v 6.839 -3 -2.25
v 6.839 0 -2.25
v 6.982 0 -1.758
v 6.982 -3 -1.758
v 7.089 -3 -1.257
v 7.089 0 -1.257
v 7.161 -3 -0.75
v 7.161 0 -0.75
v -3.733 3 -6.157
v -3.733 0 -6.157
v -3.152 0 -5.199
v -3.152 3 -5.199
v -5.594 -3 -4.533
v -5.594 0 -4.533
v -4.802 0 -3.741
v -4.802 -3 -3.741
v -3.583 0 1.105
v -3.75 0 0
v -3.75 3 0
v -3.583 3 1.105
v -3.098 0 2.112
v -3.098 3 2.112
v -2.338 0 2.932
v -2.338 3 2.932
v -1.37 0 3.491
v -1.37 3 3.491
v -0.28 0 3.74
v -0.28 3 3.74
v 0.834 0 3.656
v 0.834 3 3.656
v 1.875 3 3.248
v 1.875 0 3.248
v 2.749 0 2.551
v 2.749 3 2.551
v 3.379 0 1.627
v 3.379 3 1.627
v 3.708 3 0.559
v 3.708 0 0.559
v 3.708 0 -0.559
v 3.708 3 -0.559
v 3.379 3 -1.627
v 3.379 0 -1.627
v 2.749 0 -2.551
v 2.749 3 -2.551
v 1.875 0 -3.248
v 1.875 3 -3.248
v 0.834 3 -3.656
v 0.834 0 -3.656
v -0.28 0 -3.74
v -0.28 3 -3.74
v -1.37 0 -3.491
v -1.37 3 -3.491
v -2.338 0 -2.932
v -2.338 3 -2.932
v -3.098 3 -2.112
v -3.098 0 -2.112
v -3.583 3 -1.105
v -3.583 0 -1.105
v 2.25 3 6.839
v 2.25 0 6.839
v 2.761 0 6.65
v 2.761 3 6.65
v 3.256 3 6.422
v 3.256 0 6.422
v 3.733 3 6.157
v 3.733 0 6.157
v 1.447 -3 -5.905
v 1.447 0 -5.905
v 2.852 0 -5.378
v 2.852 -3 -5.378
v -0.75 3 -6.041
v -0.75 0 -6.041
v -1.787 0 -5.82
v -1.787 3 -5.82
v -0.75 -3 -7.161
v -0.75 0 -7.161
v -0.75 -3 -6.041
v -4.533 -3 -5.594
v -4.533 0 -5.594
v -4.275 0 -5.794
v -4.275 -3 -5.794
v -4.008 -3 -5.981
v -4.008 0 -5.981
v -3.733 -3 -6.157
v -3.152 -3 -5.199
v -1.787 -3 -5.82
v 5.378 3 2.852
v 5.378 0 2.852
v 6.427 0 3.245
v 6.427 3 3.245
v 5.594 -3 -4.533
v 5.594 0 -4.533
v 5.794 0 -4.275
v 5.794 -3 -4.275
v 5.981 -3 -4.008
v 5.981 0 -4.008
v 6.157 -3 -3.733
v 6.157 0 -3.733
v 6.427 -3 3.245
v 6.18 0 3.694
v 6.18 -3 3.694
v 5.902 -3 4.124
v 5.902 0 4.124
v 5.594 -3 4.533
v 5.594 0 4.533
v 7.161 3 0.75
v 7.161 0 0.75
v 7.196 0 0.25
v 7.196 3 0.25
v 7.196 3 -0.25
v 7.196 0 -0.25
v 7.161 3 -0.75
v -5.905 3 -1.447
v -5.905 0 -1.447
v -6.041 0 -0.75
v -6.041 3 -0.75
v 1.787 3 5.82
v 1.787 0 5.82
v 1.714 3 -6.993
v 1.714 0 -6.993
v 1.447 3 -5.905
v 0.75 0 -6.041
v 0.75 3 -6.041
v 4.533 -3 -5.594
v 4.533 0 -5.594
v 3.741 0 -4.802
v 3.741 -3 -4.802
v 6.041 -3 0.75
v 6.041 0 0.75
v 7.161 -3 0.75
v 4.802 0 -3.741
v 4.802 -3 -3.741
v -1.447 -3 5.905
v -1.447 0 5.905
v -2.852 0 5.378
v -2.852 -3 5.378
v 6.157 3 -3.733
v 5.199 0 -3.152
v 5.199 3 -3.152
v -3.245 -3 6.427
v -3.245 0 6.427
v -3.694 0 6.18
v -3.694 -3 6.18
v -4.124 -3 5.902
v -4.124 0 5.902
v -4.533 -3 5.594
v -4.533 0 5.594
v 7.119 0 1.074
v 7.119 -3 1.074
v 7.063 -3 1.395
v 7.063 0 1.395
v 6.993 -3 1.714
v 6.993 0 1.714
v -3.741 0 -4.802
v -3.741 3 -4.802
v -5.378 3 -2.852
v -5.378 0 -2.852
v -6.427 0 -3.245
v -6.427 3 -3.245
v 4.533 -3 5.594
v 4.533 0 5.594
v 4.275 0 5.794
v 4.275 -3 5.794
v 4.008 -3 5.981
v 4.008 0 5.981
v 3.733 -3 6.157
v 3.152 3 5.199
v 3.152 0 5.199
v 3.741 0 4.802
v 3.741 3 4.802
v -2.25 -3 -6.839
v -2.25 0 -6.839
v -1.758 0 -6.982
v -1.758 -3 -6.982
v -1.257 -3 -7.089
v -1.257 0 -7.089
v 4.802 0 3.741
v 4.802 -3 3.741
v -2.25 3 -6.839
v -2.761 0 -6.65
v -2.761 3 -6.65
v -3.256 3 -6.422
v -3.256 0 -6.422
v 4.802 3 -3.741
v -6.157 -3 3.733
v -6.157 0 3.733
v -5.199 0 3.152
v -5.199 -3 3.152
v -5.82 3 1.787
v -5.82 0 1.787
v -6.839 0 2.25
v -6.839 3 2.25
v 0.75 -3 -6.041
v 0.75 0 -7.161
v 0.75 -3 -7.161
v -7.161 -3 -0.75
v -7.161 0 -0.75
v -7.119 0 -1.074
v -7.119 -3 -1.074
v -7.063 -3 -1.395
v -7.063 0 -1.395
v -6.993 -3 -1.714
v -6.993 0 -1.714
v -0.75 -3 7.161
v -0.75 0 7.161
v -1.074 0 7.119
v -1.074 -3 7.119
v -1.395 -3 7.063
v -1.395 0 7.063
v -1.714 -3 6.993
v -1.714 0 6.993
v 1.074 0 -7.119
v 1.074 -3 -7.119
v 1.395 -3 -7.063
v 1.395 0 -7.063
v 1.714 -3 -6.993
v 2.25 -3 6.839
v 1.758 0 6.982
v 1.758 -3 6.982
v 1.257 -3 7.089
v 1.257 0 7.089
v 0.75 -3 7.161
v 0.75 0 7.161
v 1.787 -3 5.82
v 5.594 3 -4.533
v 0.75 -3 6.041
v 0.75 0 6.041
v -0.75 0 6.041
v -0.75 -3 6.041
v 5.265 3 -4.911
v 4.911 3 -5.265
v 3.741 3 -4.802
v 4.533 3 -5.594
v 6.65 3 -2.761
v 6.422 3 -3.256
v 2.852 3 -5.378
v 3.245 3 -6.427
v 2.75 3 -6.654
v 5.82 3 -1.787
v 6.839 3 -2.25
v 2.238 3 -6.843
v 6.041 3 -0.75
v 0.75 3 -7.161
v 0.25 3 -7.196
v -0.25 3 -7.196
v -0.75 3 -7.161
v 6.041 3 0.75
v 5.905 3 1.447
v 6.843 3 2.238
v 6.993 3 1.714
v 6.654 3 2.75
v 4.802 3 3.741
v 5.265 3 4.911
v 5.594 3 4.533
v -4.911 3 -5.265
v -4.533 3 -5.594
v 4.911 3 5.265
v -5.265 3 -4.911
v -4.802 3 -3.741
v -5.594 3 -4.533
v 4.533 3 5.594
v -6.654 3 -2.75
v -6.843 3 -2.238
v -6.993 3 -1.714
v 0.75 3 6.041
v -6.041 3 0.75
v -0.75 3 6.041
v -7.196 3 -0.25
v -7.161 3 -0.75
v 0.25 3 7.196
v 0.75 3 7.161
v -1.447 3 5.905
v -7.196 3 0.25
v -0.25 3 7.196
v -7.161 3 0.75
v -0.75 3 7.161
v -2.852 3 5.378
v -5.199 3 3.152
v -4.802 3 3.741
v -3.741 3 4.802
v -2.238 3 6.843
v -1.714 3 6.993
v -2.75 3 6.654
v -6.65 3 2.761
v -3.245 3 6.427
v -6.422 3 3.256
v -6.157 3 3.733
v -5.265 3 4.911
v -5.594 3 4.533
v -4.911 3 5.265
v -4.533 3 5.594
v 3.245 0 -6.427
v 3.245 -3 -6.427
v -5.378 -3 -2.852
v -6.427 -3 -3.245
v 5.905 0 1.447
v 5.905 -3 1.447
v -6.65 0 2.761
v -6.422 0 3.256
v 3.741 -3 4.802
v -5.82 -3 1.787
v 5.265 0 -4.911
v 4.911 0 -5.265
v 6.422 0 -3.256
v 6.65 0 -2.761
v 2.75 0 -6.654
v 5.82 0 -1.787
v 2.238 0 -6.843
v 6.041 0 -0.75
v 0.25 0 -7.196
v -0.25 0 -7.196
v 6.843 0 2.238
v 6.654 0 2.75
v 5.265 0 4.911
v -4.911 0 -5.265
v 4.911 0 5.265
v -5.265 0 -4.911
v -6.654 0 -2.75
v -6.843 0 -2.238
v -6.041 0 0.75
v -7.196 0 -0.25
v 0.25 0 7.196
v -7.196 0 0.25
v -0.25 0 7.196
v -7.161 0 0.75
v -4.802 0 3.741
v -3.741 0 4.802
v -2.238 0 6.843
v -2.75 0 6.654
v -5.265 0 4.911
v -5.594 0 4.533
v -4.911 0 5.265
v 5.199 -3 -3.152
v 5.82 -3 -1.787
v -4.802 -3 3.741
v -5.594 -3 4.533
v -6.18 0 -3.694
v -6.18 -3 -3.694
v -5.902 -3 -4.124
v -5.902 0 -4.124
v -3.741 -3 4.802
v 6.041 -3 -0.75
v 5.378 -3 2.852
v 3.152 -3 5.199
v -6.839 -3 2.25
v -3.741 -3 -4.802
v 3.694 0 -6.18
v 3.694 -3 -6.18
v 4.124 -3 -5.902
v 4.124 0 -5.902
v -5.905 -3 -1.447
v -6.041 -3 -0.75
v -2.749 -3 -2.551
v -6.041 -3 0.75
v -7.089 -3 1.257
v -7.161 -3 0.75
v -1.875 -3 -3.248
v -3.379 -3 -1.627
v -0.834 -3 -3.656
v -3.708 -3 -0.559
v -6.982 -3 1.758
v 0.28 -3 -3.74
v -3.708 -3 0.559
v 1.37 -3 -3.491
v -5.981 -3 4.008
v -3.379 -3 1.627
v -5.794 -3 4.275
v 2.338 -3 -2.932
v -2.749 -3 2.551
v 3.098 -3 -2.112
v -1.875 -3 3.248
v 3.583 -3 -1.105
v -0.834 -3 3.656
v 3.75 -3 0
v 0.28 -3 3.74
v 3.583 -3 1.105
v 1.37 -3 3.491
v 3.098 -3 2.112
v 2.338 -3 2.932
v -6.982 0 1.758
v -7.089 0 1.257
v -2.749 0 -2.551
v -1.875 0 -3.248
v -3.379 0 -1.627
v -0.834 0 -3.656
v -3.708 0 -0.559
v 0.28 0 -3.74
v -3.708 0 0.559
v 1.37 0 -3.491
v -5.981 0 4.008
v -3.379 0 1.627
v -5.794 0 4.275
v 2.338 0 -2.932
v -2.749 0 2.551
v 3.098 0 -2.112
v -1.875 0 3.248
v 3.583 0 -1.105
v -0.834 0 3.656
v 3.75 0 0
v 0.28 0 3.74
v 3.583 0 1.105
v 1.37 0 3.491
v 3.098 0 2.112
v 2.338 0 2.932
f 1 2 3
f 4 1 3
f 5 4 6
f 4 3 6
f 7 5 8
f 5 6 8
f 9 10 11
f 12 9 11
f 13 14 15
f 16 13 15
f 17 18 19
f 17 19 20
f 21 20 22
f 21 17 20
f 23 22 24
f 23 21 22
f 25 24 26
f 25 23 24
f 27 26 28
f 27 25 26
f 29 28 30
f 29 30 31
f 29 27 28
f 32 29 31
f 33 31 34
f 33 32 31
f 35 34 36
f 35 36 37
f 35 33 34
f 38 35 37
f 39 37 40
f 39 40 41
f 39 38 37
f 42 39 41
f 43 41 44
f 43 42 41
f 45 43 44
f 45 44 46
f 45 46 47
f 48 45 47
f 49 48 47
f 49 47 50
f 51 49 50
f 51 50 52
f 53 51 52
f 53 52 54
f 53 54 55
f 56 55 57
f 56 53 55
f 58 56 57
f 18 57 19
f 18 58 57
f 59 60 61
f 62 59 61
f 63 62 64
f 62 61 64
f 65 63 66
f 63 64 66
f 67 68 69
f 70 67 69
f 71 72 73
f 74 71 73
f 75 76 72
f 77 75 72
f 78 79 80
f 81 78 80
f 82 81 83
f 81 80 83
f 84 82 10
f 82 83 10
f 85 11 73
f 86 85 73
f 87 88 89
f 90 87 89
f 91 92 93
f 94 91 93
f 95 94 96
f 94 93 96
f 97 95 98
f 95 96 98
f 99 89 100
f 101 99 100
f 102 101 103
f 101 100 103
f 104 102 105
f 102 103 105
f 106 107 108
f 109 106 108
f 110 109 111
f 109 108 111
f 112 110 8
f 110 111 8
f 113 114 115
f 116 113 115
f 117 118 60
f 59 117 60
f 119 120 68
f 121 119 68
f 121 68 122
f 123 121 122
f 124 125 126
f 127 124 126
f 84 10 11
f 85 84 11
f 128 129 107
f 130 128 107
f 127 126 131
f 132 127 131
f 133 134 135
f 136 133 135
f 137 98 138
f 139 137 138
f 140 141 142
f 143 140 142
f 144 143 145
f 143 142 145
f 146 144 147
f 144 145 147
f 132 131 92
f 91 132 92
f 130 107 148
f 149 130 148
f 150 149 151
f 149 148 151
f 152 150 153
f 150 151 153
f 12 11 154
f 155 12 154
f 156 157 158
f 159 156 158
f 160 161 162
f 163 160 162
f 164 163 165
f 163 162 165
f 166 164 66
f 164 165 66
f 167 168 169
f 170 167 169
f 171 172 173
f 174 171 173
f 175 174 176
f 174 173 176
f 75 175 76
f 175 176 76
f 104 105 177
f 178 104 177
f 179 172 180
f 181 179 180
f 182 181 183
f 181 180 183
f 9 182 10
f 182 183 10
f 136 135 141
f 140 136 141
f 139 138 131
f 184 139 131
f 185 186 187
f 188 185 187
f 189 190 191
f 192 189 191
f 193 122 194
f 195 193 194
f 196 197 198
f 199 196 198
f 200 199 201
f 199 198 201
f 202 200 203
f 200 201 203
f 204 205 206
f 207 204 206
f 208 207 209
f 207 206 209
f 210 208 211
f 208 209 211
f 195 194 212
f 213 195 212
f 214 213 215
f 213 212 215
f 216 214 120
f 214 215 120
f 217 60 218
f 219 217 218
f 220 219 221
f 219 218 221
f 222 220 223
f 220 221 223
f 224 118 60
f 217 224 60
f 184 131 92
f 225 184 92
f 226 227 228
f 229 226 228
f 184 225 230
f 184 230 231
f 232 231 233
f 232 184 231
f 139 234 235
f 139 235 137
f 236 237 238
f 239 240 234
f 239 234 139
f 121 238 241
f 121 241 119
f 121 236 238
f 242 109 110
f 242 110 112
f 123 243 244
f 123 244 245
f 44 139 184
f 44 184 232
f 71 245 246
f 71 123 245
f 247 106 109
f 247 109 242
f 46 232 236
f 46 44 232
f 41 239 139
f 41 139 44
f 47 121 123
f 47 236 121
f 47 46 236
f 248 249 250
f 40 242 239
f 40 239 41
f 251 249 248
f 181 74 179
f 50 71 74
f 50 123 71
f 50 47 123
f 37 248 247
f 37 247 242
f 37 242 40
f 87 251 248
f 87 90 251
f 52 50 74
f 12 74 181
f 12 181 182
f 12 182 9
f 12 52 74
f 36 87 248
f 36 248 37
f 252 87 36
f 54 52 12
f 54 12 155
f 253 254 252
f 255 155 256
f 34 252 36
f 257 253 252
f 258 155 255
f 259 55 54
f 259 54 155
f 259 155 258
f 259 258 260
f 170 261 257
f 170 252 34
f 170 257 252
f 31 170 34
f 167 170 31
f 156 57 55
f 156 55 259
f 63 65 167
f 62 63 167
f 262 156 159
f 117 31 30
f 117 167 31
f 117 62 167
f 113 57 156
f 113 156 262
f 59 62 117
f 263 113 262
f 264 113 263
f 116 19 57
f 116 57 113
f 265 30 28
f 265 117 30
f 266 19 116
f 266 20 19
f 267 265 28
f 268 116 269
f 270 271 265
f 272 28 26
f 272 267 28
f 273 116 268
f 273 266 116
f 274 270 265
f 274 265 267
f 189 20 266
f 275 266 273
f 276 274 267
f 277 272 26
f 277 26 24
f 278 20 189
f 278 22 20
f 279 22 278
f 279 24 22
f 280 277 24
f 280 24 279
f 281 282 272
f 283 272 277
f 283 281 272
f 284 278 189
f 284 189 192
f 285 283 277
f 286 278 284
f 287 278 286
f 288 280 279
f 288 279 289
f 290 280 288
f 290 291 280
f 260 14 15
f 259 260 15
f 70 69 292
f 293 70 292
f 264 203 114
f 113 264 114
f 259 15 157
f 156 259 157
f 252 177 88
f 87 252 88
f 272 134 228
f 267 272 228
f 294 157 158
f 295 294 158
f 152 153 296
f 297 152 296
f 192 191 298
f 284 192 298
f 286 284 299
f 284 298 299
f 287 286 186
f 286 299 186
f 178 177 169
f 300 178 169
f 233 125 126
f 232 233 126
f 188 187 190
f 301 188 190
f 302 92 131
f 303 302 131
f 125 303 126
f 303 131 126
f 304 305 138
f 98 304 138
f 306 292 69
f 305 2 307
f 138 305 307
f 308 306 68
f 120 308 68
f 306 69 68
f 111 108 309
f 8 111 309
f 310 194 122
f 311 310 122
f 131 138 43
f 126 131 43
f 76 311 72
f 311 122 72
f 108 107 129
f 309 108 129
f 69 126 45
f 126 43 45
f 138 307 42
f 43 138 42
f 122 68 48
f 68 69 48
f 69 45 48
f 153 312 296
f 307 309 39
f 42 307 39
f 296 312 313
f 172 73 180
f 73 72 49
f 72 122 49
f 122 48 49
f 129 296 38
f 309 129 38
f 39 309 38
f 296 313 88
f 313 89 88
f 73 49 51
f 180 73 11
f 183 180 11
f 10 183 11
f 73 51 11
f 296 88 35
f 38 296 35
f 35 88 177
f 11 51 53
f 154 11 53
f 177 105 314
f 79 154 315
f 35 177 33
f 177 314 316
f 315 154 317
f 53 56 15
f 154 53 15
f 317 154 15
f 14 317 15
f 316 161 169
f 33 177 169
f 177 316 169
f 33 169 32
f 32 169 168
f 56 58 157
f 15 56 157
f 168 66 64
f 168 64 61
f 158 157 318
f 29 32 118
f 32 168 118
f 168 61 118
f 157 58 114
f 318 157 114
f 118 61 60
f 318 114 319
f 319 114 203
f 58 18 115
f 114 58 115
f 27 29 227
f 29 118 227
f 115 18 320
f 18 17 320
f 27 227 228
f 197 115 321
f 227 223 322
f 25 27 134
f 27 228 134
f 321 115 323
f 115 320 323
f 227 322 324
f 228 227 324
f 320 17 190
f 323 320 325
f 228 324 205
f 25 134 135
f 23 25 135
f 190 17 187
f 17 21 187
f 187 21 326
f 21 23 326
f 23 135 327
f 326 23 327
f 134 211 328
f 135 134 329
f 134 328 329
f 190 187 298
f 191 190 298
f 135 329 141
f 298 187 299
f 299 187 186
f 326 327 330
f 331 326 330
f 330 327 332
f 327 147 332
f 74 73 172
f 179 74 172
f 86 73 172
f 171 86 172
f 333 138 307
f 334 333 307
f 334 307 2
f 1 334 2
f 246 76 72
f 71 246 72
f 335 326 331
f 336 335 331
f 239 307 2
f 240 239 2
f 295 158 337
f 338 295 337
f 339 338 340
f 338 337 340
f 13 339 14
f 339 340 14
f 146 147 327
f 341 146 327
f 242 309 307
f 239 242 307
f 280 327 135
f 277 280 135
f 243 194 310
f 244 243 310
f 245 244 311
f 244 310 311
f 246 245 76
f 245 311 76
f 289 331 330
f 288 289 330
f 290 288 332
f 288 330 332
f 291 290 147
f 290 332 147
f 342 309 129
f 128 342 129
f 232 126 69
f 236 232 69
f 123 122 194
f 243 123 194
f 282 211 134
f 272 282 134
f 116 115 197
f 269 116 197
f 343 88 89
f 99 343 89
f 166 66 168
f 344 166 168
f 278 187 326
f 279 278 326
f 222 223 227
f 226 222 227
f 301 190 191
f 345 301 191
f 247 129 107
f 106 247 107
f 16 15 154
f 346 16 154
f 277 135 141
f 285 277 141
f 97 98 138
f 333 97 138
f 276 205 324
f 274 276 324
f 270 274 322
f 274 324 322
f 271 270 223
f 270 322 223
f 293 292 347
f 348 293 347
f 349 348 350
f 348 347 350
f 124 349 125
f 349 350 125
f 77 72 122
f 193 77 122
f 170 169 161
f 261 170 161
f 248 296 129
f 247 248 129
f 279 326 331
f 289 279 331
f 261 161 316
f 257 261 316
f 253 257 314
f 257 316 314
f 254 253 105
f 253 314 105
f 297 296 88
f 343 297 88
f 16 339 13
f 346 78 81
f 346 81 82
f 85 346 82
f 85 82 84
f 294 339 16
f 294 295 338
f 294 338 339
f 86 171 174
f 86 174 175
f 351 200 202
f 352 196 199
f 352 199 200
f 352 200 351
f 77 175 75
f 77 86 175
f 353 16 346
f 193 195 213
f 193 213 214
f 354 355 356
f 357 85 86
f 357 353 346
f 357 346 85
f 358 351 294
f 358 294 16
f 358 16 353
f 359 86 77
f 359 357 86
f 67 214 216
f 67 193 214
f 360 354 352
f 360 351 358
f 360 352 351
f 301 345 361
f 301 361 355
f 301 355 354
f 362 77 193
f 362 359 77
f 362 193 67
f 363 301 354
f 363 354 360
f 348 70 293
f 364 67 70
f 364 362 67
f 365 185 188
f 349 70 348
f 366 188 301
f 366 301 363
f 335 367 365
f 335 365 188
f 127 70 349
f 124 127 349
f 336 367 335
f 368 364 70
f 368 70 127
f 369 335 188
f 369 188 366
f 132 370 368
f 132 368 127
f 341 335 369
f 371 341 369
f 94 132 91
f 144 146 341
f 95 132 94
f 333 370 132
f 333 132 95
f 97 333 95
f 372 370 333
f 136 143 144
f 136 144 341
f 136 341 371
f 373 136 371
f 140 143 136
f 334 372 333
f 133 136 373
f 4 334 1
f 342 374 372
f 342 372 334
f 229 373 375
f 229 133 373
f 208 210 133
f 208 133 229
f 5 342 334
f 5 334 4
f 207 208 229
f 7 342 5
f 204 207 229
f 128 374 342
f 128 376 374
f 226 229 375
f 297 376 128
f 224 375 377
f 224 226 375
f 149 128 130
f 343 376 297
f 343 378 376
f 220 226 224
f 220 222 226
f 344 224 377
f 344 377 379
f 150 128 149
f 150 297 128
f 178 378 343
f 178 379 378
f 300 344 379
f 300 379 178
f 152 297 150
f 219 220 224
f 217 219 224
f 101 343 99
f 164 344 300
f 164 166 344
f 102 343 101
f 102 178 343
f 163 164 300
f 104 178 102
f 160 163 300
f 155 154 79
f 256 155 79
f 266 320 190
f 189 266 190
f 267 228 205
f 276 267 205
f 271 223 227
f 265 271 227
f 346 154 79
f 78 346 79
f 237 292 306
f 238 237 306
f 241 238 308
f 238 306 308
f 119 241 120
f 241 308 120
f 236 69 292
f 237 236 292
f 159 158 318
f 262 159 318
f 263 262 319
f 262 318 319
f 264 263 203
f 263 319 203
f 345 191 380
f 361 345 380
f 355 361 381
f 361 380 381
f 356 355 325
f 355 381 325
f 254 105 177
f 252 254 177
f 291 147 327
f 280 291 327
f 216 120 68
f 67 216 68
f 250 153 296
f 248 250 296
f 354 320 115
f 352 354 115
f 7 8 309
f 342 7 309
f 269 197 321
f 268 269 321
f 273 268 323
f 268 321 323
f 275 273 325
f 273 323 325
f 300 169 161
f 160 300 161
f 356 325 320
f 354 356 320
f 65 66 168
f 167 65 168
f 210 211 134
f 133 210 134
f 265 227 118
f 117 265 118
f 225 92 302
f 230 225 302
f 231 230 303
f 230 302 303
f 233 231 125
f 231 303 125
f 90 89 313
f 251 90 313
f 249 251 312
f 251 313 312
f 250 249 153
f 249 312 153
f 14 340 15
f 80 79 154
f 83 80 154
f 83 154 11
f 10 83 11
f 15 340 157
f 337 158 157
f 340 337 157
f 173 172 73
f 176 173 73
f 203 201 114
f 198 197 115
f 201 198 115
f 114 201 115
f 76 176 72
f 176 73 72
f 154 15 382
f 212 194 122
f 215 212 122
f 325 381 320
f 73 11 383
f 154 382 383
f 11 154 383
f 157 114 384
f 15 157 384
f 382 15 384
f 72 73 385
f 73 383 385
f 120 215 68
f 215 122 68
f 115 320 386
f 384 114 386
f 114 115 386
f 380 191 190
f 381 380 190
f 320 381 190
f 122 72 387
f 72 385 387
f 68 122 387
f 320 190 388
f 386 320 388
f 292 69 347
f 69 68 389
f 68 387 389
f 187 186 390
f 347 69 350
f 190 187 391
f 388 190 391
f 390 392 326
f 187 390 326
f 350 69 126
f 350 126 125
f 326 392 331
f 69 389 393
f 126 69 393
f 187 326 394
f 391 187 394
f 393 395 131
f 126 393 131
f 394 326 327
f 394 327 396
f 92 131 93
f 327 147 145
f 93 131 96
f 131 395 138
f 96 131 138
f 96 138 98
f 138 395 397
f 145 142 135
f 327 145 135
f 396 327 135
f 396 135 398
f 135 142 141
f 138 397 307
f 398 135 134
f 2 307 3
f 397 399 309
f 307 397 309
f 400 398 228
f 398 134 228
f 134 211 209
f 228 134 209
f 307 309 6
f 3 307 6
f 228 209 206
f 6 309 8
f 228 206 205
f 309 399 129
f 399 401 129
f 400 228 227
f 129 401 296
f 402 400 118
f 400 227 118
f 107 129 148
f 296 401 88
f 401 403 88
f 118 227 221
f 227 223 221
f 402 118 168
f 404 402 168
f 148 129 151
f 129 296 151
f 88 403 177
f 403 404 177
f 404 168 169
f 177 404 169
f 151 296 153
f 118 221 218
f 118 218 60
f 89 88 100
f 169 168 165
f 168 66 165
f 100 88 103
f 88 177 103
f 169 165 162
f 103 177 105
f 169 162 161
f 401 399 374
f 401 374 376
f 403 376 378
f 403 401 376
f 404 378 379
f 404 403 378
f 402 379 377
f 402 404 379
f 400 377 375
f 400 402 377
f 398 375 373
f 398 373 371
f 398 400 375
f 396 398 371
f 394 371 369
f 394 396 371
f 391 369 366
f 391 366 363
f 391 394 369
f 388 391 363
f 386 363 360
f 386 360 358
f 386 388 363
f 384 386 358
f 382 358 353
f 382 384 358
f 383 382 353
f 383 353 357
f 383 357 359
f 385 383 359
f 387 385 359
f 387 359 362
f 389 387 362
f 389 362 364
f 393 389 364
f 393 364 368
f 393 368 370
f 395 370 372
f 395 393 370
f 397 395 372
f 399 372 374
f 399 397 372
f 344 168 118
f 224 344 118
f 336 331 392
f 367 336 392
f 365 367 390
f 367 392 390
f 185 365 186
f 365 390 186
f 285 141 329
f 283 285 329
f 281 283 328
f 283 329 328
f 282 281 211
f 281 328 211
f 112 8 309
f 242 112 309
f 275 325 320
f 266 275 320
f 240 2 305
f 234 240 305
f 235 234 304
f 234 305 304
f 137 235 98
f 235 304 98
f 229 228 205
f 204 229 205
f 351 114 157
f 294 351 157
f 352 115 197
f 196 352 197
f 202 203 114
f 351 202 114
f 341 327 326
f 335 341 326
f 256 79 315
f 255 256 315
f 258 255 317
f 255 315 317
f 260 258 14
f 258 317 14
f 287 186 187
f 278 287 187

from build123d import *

# Parameters (mm, degrees)
F0_R     = 3.75
F1_DEPTH = 3
F2_R     = 3.75
F3_DEPTH = 3


with BuildPart() as f1:
    # F0 (on Front) → F1 (new body)
    with BuildSketch(Plane.XZ):
        with BuildLine():
            Line((-0.75, 6.040831), (-0.75, 7.160831))
            ThreePointArc((-0.75, 7.160831), (-1.234895, 7.093309), (-1.71408, 6.992992))
            Line((-1.71408, 6.992992), (-1.447445, 5.905193))
            Line((-1.447445, 5.905193), (-2.851935, 5.378496))
            Line((-2.851935, 5.378496), (-3.245201, 6.427182))
            ThreePointArc((-3.245201, 6.427182), (-3.91143, 6.044891), (-4.533142, 5.593802))
            Line((-4.533142, 5.593802), (-3.741182, 4.801843))
            Line((-3.741182, 4.801843), (-4.801843, 3.741182))
            Line((-4.801843, 3.741182), (-5.593802, 4.533142))
            ThreePointArc((-5.593802, 4.533142), (-5.888929, 4.142525), (-6.156829, 3.732754))
            Line((-6.156829, 3.732754), (-5.1991, 3.152104))
            Line((-5.1991, 3.152104), (-5.819794, 1.786549))
            Line((-5.819794, 1.786549), (-6.839408, 2.25))
            ThreePointArc((-6.839408, 2.25), (-7.040183, 1.508585), (-7.160831, 0.75))
            Line((-7.160831, 0.75), (-6.040831, 0.75))
            Line((-6.040831, 0.75), (-6.040831, -0.75))
            Line((-6.040831, -0.75), (-7.160831, -0.75))
            ThreePointArc((-7.160831, -0.75), (-7.093309, -1.234895), (-6.992992, -1.71408))
            Line((-6.992992, -1.71408), (-5.905193, -1.447445))
            Line((-5.905193, -1.447445), (-5.378496, -2.851935))
            Line((-5.378496, -2.851935), (-6.427182, -3.245201))
            ThreePointArc((-6.427182, -3.245201), (-6.044891, -3.91143), (-5.593802, -4.533142))
            Line((-5.593802, -4.533142), (-4.801843, -3.741182))
            Line((-4.801843, -3.741182), (-3.741182, -4.801843))
            Line((-3.741182, -4.801843), (-4.533142, -5.593802))
            ThreePointArc((-4.533142, -5.593802), (-4.142525, -5.888929), (-3.732754, -6.156829))
            Line((-3.732754, -6.156829), (-3.152104, -5.1991))
            Line((-3.152104, -5.1991), (-1.786549, -5.819794))
            Line((-1.786549, -5.819794), (-2.25, -6.839408))
            ThreePointArc((-2.25, -6.839408), (-1.508585, -7.040183), (-0.75, -7.160831))
            Line((-0.75, -7.160831), (-0.75, -6.040831))
            Line((-0.75, -6.040831), (0.75, -6.040831))
            Line((0.75, -6.040831), (0.75, -7.160831))
            ThreePointArc((0.75, -7.160831), (1.234895, -7.093309), (1.71408, -6.992992))
            Line((1.71408, -6.992992), (1.447445, -5.905193))
            Line((1.447445, -5.905193), (2.851935, -5.378496))
            Line((2.851935, -5.378496), (3.245201, -6.427182))
            ThreePointArc((3.245201, -6.427182), (3.91143, -6.044891), (4.533142, -5.593802))
            Line((4.533142, -5.593802), (3.741182, -4.801843))
            Line((3.741182, -4.801843), (4.801843, -3.741182))
            Line((4.801843, -3.741182), (5.593802, -4.533142))
            ThreePointArc((5.593802, -4.533142), (5.888929, -4.142525), (6.156829, -3.732754))
            Line((6.156829, -3.732754), (5.1991, -3.152104))
            Line((5.1991, -3.152104), (5.819794, -1.786549))
            Line((5.819794, -1.786549), (6.839408, -2.25))
            ThreePointArc((6.839408, -2.25), (7.040183, -1.508585), (7.160831, -0.75))
            Line((7.160831, -0.75), (6.040831, -0.75))
            Line((6.040831, -0.75), (6.040831, 0.75))
            Line((6.040831, 0.75), (7.160831, 0.75))
            ThreePointArc((7.160831, 0.75), (7.093309, 1.234895), (6.992992, 1.71408))
            Line((6.992992, 1.71408), (5.905193, 1.447445))
            Line((5.905193, 1.447445), (5.378496, 2.851935))
            Line((5.378496, 2.851935), (6.427182, 3.245201))
            ThreePointArc((6.427182, 3.245201), (6.044891, 3.91143), (5.593802, 4.533142))
            Line((5.593802, 4.533142), (4.801843, 3.741182))
            Line((4.801843, 3.741182), (3.741182, 4.801843))
            Line((3.741182, 4.801843), (4.533142, 5.593802))
            ThreePointArc((4.533142, 5.593802), (4.142525, 5.888929), (3.732754, 6.156829))
            Line((3.732754, 6.156829), (3.152104, 5.1991))
            Line((3.152104, 5.1991), (1.786549, 5.819794))
            Line((1.786549, 5.819794), (2.25, 6.839408))
            ThreePointArc((2.25, 6.839408), (1.508585, 7.040183), (0.75, 7.160831))
            Line((0.75, 7.160831), (0.75, 6.040831))
            Line((0.75, 6.040831), (-0.75, 6.040831))
        make_face()
        Circle(F0_R, mode=Mode.SUBTRACT)
    extrude(amount=F1_DEPTH)


with BuildPart() as f3:
    # F2 (on face) → F3 (new body)
    with BuildSketch(Plane(origin=(0, 0, 0), x_dir=(-1, 0, 0), z_dir=(0, 1, 0))):
        with BuildLine():
            Line((-1.786549, 5.819794), (-2.25, 6.839408))
            ThreePointArc((-2.25, 6.839408), (-3.010783, 6.540274), (-3.732754, 6.156829))
            Line((-3.732754, 6.156829), (-3.152104, 5.1991))
            Line((-3.152104, 5.1991), (-3.741182, 4.801843))
            Line((-3.741182, 4.801843), (-4.533142, 5.593802))
            ThreePointArc((-4.533142, 5.593802), (-5.091169, 5.091169), (-5.593802, 4.533142))
            Line((-5.593802, 4.533142), (-4.801843, 3.741182))
            Line((-4.801843, 3.741182), (-5.378496, 2.851935))
            Line((-5.378496, 2.851935), (-6.427182, 3.245201))
            ThreePointArc((-6.427182, 3.245201), (-6.753617, 2.495727), (-6.992992, 1.71408))
            Line((-6.992992, 1.71408), (-5.905193, 1.447445))
            Line((-5.905193, 1.447445), (-6.040831, 0.75))
            Line((-6.040831, 0.75), (-7.160831, 0.75))
            ThreePointArc((-7.160831, 0.75), (-7.2, 0), (-7.160831, -0.75))
            Line((-7.160831, -0.75), (-6.040831, -0.75))
            Line((-6.040831, -0.75), (-5.819794, -1.786549))
            Line((-5.819794, -1.786549), (-6.839408, -2.25))
            ThreePointArc((-6.839408, -2.25), (-6.540274, -3.010783), (-6.156829, -3.732754))
            Line((-6.156829, -3.732754), (-5.1991, -3.152104))
            Line((-5.1991, -3.152104), (-4.801843, -3.741182))
            Line((-4.801843, -3.741182), (-5.593802, -4.533142))
            ThreePointArc((-5.593802, -4.533142), (-5.091169, -5.091169), (-4.533142, -5.593802))
            Line((-4.533142, -5.593802), (-3.741182, -4.801843))
            Line((-3.741182, -4.801843), (-2.851935, -5.378496))
            Line((-2.851935, -5.378496), (-3.245201, -6.427182))
            ThreePointArc((-3.245201, -6.427182), (-2.495727, -6.753617), (-1.71408, -6.992992))
            Line((-1.71408, -6.992992), (-1.447445, -5.905193))
            Line((-1.447445, -5.905193), (-0.75, -6.040831))
            Line((-0.75, -6.040831), (-0.75, -7.160831))
            ThreePointArc((-0.75, -7.160831), (0, -7.2), (0.75, -7.160831))
            Line((0.75, -7.160831), (0.75, -6.040831))
            Line((0.75, -6.040831), (1.786549, -5.819794))
            Line((1.786549, -5.819794), (2.25, -6.839408))
            ThreePointArc((2.25, -6.839408), (3.010783, -6.540274), (3.732754, -6.156829))
            Line((3.732754, -6.156829), (3.152104, -5.1991))
            Line((3.152104, -5.1991), (3.741182, -4.801843))
            Line((3.741182, -4.801843), (4.533142, -5.593802))
            ThreePointArc((4.533142, -5.593802), (5.091169, -5.091169), (5.593802, -4.533142))
            Line((5.593802, -4.533142), (4.801843, -3.741182))
            Line((4.801843, -3.741182), (5.378496, -2.851935))
            Line((5.378496, -2.851935), (6.427182, -3.245201))
            ThreePointArc((6.427182, -3.245201), (6.753617, -2.495727), (6.992992, -1.71408))
            Line((6.992992, -1.71408), (5.905193, -1.447445))
            Line((5.905193, -1.447445), (6.040831, -0.75))
            Line((6.040831, -0.75), (7.160831, -0.75))
            ThreePointArc((7.160831, -0.75), (7.2, 0), (7.160831, 0.75))
            Line((7.160831, 0.75), (6.040831, 0.75))
            Line((6.040831, 0.75), (5.819794, 1.786549))
            Line((5.819794, 1.786549), (6.839408, 2.25))
            ThreePointArc((6.839408, 2.25), (6.540274, 3.010783), (6.156829, 3.732754))
            Line((6.156829, 3.732754), (5.1991, 3.152104))
            Line((5.1991, 3.152104), (4.801843, 3.741182))
            Line((4.801843, 3.741182), (5.593802, 4.533142))
            ThreePointArc((5.593802, 4.533142), (5.091169, 5.091169), (4.533142, 5.593802))
            Line((4.533142, 5.593802), (3.741182, 4.801843))
            Line((3.741182, 4.801843), (2.851935, 5.378496))
            Line((2.851935, 5.378496), (3.245201, 6.427182))
            ThreePointArc((3.245201, 6.427182), (2.495727, 6.753617), (1.71408, 6.992992))
            Line((1.71408, 6.992992), (1.447445, 5.905193))
            Line((1.447445, 5.905193), (0.75, 6.040831))
            Line((0.75, 6.040831), (0.75, 7.160831))
            ThreePointArc((0.75, 7.160831), (0, 7.2), (-0.75, 7.160831))
            Line((-0.75, 7.160831), (-0.75, 6.040831))
            Line((-0.75, 6.040831), (-1.786549, 5.819794))
        make_face()
        Circle(F2_R, mode=Mode.SUBTRACT)
    extrude(amount=F3_DEPTH)


solid = Compound([f1.part, f3.part])
